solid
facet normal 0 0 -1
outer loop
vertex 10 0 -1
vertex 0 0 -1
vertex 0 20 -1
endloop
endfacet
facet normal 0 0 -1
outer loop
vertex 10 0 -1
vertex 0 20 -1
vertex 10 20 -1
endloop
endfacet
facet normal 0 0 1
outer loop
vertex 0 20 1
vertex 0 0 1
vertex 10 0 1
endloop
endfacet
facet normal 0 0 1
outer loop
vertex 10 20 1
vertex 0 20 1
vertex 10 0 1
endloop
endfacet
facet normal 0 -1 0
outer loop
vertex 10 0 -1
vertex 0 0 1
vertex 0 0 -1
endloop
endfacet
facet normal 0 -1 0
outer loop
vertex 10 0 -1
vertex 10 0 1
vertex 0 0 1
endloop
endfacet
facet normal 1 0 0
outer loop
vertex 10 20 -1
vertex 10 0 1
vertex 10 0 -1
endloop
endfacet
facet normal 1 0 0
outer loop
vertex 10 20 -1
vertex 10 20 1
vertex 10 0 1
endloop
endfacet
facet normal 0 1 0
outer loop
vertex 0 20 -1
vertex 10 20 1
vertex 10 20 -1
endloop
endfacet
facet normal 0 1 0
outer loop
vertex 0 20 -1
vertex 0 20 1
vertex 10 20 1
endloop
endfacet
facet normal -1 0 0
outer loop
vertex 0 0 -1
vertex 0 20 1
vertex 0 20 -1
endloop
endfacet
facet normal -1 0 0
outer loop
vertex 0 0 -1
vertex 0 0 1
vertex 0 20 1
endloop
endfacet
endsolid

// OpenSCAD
// created by IndiePandaaaaa|Lukas
// encoding: utf-8

TOLERANCE = .12;
THICKNESS = 1.5;
$fn = $preview ? 25 : 125;

KEY_LENGTH = 64.8;
KEY_WIDTH = 25.3;
KEY_THICKNESS = 2;
KEY_RADIUS = 7.2;
KEY_HOLE = [6.2, 5.2, 5.2]; // diameter, X Pos, Y Pos

module case_side_popout() {
  module key_shape(size_added = 0) {
    circle_loc = [
      [KEY_RADIUS, KEY_RADIUS],
      [KEY_LENGTH - KEY_RADIUS + size_added * 2, KEY_RADIUS],
      [KEY_LENGTH - KEY_RADIUS + size_added * 2, KEY_WIDTH - KEY_RADIUS + size_added * 2],
      [KEY_RADIUS, KEY_WIDTH - KEY_RADIUS + size_added * 2],
    ];

    translate([-size_added, -size_added]) union() {
        polygon(
          [
            [0, KEY_RADIUS],
            [KEY_RADIUS, 0],
            [KEY_LENGTH - KEY_RADIUS + size_added * 2, 0],
            [KEY_LENGTH + size_added * 2, KEY_RADIUS],
            [KEY_LENGTH + size_added * 2, KEY_WIDTH - KEY_RADIUS + size_added * 2],
            [KEY_LENGTH - KEY_RADIUS + size_added * 2, KEY_WIDTH + size_added * 2],
            [KEY_RADIUS, KEY_WIDTH + size_added * 2],
            [0, KEY_WIDTH - KEY_RADIUS + size_added * 2],
          ]
        );

        for (i = [0:len(circle_loc) - 1]) {
          translate(circle_loc[i]) circle(r=KEY_RADIUS);
        }
      }
  }

  union() {
    linear_extrude(THICKNESS + KEY_THICKNESS + TOLERANCE) {
      // key border
      difference() {
        key_shape(size_added=THICKNESS + TOLERANCE); // outer contour
        key_shape(size_added=0); // inner contour
      }
    }
    linear_extrude(THICKNESS) {
      finger_hole = [18, 15, 3];
      difference() {
        key_shape(size_added=TOLERANCE * 2); // outer contour
        translate([KEY_LENGTH / 2 - finger_hole[0] / 2, KEY_WIDTH / 2 - finger_hole[1] / 2]) minkowski() {
            // inner contour
            translate([finger_hole[2], finger_hole[2]]) square([finger_hole[0] - finger_hole[2] * 2 - TOLERANCE, finger_hole[1] - finger_hole[2] * 2 - TOLERANCE]);
            circle(r=KEY_RADIUS + TOLERANCE / 2);
          }
        translate([KEY_HOLE[1], KEY_HOLE[2]]) circle(d=KEY_HOLE[0]);
      }
    }
  }
}
//KEY_LENGTH = 64.8;
//KEY_WIDTH = 25.3;
//KEY_THICKNESS = 2;
//KEY_RADIUS = 7.2;
//KEY_HOLE = [6.2, 5.2, 5.2]; // diameter, X Pos, Y Pos

module case_top_slide() {
  // case to slide out the key to the top, like a pocket knive
  module simplyfied_key_shape(thickness = 2) {
    linear_extrude(height=thickness, center=true) {
      translate(v=[0, 0, 0]) square([10, 20]);
    }
  }

  simplyfied_key_shape(thickness=2);
}

//case_side_popout();
case_top_slide();
